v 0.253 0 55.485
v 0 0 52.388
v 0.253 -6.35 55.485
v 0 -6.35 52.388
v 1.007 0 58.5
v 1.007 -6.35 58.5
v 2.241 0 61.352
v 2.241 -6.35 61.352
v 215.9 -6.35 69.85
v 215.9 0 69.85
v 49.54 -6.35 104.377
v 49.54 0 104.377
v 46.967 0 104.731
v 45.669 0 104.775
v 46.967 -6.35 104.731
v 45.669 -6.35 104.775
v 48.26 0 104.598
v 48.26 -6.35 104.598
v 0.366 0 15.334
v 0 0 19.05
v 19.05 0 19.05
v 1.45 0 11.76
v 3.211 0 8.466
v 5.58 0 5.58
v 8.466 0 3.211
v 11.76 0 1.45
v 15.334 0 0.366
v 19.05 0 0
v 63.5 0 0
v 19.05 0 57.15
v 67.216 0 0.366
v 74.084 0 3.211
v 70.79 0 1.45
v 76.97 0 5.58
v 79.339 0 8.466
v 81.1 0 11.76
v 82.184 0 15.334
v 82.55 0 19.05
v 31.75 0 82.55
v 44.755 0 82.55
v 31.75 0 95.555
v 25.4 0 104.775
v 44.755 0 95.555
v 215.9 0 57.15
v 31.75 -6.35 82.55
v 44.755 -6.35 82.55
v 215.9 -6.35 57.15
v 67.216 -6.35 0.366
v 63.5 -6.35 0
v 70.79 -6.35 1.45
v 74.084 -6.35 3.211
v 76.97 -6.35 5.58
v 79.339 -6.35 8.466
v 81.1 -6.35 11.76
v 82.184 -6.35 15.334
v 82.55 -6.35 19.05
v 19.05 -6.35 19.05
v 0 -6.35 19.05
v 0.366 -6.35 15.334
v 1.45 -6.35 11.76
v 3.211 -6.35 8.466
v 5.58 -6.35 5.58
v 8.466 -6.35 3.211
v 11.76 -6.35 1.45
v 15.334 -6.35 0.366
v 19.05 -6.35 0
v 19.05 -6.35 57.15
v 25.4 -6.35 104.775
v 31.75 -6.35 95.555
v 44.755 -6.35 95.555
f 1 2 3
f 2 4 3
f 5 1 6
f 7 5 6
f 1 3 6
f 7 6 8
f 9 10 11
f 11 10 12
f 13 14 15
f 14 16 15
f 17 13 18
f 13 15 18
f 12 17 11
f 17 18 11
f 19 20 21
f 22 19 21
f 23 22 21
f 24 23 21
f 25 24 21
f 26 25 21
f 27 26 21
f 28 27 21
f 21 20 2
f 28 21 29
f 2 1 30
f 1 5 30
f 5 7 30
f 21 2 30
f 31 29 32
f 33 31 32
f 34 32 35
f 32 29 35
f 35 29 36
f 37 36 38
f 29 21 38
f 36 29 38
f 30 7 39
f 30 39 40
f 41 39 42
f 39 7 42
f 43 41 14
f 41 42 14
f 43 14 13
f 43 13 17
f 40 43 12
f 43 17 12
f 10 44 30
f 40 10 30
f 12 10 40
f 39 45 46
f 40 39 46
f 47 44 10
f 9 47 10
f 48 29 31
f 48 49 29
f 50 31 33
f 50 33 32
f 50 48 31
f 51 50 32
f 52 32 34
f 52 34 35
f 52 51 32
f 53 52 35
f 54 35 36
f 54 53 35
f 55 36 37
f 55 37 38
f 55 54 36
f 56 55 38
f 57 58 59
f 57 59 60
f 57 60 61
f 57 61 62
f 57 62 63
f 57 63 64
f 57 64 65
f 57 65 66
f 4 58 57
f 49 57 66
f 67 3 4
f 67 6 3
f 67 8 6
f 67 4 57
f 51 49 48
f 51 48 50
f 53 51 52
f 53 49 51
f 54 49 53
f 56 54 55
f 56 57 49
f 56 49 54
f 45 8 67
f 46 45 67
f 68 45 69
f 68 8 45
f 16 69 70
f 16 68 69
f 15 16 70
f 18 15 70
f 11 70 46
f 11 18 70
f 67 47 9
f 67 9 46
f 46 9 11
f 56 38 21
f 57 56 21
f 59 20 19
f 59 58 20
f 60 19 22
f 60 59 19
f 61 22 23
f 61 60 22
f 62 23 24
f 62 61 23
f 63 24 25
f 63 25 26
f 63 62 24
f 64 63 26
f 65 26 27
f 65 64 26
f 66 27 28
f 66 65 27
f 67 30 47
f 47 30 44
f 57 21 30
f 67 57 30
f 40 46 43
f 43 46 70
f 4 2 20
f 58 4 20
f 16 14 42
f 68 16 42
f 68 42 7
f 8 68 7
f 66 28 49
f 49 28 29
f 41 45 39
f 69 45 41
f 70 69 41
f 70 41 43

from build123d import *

# Parameters (mm, degrees)
F1_DEPTH = 6.35
F2_W     = 13.0048
F2_H     = 13.0048
F3_DEPTH = 6.351
F4_R     = 19.04999


# Not quite as in the source:
# - a fillet or chamfer is up to 0.001 mm smaller than in the source, because OpenCascade refuses the exact size


with BuildPart() as f1:
    # F0 (on Front) → F1 (new body)
    with BuildSketch(Plane.XZ):
        Polygon((0, 57.15), (0, 0), (82.55, 0), (82.55, 19.05), (19.05, 19.05), (19.05, 57.15), (215.9, 57.15), (215.9, 69.85), (47.625, 104.775), (25.4, 104.775), align=None)
    extrude(amount=F1_DEPTH)

    # F2 (on face) → F3 (cut, through all)
    with BuildSketch(Plane.XZ.offset(6.35)):
        with Locations((38.2524, 89.0524)):
            Rectangle(F2_W, F2_H)
    extrude(amount=-F3_DEPTH, mode=Mode.SUBTRACT)

    # F4 (radius 19.05 in the source; OpenCascade refuses exactly that, so slightly less here)
    f4_edges = [f1.edges().sort_by_distance(p)[0] for p in [
        (0, -3.175, 0),
        (82.55, -3.175, 0),
        (0, -3.175, 57.15),
        (47.625, -3.175, 104.775),
    ]]
    fillet(f4_edges, radius=F4_R)


solid = f1.part
